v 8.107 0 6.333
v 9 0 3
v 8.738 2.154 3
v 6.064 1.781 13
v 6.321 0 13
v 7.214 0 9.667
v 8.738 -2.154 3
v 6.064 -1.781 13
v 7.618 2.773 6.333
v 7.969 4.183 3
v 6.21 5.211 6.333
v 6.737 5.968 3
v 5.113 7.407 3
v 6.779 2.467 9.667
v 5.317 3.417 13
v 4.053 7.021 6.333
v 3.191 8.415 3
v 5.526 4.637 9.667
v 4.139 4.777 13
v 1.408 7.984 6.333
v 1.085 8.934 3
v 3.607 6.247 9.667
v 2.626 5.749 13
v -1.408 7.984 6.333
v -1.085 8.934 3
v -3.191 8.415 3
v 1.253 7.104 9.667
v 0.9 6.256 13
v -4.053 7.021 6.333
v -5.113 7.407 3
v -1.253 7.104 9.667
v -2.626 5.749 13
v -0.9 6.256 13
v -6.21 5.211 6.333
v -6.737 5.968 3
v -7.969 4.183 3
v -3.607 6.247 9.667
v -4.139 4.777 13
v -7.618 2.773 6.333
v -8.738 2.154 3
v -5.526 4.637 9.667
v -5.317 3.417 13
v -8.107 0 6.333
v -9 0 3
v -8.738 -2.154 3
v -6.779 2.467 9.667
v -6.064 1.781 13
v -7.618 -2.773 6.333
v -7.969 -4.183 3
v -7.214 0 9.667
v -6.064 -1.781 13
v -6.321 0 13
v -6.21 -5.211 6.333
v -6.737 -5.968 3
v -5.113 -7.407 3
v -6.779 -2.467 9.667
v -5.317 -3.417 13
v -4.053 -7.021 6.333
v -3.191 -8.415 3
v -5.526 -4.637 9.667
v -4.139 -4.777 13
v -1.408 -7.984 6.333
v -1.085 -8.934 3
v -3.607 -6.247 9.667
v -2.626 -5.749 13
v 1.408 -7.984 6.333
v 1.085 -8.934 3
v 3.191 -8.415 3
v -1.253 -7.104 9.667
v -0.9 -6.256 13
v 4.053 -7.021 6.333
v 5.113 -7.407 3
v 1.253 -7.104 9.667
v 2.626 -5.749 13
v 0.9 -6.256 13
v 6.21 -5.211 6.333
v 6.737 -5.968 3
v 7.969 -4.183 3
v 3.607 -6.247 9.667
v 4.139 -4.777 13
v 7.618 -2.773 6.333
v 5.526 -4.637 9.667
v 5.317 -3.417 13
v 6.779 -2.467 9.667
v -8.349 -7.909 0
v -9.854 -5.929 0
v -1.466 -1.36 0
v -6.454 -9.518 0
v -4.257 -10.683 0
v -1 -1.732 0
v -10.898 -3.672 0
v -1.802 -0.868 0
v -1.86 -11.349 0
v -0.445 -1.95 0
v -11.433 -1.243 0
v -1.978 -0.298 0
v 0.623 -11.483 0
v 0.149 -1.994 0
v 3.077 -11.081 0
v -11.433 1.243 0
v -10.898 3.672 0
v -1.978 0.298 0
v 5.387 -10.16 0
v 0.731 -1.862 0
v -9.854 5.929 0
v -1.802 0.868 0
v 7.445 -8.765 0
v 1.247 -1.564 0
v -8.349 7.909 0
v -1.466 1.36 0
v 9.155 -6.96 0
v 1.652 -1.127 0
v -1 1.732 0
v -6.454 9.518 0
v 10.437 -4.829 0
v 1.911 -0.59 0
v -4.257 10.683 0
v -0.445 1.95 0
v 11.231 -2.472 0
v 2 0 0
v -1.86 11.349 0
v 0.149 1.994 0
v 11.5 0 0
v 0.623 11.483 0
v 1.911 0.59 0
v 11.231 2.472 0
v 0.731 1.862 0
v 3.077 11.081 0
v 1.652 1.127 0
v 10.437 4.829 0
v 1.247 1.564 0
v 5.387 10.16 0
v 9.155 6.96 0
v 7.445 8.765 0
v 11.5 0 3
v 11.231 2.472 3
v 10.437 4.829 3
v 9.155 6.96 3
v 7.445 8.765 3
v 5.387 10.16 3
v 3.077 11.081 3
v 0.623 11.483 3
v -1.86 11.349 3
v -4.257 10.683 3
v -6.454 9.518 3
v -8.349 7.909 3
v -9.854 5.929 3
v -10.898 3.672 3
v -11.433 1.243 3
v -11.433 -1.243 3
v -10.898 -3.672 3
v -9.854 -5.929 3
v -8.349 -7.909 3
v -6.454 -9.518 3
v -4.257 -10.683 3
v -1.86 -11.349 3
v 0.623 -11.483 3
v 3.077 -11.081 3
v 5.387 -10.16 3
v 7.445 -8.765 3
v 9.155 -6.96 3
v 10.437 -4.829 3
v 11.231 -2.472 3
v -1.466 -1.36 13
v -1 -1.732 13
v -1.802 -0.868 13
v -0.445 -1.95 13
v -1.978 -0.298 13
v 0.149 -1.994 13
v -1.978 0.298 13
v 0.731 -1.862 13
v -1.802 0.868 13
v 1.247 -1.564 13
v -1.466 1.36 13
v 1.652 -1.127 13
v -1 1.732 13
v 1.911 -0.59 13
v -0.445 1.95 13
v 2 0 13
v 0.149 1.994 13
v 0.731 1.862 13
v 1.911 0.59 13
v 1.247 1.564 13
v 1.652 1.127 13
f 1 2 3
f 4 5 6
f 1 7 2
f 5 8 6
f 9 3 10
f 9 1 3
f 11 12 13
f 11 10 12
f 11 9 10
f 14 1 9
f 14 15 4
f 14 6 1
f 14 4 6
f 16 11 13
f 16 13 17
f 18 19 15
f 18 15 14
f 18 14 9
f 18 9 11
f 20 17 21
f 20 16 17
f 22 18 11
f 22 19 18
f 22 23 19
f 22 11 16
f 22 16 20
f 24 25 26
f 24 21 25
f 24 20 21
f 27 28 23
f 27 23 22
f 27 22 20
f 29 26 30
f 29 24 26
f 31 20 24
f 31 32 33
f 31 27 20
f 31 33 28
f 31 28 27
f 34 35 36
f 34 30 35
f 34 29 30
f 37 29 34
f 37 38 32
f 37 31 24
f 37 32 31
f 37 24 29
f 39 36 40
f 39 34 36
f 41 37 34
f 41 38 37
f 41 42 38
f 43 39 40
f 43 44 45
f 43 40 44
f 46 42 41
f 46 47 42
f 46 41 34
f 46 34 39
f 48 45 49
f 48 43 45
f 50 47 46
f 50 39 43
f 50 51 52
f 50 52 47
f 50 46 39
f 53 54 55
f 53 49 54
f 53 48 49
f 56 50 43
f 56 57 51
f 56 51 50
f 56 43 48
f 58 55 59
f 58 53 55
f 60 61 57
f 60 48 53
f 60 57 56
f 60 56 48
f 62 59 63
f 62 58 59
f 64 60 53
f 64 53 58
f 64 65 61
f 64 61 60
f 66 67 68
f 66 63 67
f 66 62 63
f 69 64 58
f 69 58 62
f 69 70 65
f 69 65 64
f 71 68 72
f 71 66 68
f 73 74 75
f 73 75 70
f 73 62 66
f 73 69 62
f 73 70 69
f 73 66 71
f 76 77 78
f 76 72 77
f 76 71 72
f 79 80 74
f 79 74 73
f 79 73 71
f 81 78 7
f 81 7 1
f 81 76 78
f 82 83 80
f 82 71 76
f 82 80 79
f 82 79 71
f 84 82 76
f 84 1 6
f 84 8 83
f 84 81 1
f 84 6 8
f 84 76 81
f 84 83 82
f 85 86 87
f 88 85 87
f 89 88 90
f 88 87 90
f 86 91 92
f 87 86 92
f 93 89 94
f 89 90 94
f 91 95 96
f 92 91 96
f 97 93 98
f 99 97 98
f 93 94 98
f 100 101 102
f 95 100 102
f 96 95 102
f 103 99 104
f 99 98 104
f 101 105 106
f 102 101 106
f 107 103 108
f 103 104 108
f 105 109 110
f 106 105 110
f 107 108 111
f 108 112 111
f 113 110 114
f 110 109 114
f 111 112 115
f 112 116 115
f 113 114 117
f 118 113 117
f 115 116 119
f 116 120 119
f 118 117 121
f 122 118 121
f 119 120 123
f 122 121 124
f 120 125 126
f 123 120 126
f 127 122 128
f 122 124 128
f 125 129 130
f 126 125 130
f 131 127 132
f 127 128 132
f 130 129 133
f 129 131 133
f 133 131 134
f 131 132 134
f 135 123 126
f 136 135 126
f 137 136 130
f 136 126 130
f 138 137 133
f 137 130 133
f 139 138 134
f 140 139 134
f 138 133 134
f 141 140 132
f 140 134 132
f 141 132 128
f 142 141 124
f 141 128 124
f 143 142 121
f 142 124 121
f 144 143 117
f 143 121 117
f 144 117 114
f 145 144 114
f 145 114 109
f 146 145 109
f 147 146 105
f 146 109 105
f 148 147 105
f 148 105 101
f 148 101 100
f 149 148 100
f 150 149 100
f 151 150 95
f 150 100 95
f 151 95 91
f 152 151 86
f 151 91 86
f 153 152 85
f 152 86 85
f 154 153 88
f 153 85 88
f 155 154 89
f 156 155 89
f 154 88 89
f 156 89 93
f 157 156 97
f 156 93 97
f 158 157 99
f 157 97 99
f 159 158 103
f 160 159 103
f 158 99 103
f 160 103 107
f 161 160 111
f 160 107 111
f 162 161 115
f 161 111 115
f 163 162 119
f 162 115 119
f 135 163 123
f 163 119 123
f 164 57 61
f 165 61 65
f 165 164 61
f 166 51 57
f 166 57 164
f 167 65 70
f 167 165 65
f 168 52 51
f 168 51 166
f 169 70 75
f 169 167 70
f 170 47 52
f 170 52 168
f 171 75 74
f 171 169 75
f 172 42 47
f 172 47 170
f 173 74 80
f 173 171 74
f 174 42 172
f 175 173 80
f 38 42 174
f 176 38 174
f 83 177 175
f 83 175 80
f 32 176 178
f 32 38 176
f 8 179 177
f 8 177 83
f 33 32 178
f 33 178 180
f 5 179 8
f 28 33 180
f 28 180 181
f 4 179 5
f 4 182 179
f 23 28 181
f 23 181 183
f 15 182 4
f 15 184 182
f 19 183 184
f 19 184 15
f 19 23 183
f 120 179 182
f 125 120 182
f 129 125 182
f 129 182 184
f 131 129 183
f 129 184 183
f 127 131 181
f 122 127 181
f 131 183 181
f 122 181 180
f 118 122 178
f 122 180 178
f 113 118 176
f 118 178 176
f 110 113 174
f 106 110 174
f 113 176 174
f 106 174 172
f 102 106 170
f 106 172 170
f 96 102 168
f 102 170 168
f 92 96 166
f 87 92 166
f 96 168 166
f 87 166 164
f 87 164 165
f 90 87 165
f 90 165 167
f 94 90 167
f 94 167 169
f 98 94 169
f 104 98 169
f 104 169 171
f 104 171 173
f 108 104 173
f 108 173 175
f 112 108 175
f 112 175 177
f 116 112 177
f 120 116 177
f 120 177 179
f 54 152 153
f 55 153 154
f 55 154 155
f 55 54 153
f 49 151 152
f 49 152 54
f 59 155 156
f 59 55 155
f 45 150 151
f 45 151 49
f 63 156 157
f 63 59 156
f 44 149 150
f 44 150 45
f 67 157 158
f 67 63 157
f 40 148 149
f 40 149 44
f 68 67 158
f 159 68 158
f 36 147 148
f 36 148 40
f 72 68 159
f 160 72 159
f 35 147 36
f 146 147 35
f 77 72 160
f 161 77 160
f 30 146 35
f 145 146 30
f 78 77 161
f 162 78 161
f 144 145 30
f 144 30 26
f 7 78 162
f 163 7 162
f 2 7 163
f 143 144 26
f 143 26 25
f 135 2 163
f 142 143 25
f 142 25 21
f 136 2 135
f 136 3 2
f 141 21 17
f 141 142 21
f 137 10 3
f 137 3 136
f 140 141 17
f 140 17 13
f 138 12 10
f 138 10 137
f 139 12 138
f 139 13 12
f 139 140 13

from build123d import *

# Parameters (mm, degrees)
SKETCH1_R           = 11.5
BOSS_EXTRUDE1_DEPTH = 3
SKETCH2_R           = 9
BOSS_EXTRUDE2_DEPTH = 10
BOSS_EXTRUDE2_TAPER = 15
SKETCH3_R           = 2
CUT_EXTRUDE1_DEPTH  = 21.820662814


with BuildPart() as part:
    # Sketch1 → Boss-Extrude1 (new body)
    with BuildSketch(Plane.XY):
        Circle(SKETCH1_R)
    extrude(amount=BOSS_EXTRUDE1_DEPTH)

    # Sketch2 → Boss-Extrude2 (add)
    with BuildSketch(Plane.XY.offset(3)):
        Circle(SKETCH2_R)
    extrude(amount=BOSS_EXTRUDE2_DEPTH, taper=BOSS_EXTRUDE2_TAPER)

    # Sketch3 → Cut-Extrude1 (cut, through all)
    with BuildSketch(Plane.XY.offset(13)):
        Circle(SKETCH3_R)
    extrude(amount=-CUT_EXTRUDE1_DEPTH, mode=Mode.SUBTRACT)


solid = part.part
